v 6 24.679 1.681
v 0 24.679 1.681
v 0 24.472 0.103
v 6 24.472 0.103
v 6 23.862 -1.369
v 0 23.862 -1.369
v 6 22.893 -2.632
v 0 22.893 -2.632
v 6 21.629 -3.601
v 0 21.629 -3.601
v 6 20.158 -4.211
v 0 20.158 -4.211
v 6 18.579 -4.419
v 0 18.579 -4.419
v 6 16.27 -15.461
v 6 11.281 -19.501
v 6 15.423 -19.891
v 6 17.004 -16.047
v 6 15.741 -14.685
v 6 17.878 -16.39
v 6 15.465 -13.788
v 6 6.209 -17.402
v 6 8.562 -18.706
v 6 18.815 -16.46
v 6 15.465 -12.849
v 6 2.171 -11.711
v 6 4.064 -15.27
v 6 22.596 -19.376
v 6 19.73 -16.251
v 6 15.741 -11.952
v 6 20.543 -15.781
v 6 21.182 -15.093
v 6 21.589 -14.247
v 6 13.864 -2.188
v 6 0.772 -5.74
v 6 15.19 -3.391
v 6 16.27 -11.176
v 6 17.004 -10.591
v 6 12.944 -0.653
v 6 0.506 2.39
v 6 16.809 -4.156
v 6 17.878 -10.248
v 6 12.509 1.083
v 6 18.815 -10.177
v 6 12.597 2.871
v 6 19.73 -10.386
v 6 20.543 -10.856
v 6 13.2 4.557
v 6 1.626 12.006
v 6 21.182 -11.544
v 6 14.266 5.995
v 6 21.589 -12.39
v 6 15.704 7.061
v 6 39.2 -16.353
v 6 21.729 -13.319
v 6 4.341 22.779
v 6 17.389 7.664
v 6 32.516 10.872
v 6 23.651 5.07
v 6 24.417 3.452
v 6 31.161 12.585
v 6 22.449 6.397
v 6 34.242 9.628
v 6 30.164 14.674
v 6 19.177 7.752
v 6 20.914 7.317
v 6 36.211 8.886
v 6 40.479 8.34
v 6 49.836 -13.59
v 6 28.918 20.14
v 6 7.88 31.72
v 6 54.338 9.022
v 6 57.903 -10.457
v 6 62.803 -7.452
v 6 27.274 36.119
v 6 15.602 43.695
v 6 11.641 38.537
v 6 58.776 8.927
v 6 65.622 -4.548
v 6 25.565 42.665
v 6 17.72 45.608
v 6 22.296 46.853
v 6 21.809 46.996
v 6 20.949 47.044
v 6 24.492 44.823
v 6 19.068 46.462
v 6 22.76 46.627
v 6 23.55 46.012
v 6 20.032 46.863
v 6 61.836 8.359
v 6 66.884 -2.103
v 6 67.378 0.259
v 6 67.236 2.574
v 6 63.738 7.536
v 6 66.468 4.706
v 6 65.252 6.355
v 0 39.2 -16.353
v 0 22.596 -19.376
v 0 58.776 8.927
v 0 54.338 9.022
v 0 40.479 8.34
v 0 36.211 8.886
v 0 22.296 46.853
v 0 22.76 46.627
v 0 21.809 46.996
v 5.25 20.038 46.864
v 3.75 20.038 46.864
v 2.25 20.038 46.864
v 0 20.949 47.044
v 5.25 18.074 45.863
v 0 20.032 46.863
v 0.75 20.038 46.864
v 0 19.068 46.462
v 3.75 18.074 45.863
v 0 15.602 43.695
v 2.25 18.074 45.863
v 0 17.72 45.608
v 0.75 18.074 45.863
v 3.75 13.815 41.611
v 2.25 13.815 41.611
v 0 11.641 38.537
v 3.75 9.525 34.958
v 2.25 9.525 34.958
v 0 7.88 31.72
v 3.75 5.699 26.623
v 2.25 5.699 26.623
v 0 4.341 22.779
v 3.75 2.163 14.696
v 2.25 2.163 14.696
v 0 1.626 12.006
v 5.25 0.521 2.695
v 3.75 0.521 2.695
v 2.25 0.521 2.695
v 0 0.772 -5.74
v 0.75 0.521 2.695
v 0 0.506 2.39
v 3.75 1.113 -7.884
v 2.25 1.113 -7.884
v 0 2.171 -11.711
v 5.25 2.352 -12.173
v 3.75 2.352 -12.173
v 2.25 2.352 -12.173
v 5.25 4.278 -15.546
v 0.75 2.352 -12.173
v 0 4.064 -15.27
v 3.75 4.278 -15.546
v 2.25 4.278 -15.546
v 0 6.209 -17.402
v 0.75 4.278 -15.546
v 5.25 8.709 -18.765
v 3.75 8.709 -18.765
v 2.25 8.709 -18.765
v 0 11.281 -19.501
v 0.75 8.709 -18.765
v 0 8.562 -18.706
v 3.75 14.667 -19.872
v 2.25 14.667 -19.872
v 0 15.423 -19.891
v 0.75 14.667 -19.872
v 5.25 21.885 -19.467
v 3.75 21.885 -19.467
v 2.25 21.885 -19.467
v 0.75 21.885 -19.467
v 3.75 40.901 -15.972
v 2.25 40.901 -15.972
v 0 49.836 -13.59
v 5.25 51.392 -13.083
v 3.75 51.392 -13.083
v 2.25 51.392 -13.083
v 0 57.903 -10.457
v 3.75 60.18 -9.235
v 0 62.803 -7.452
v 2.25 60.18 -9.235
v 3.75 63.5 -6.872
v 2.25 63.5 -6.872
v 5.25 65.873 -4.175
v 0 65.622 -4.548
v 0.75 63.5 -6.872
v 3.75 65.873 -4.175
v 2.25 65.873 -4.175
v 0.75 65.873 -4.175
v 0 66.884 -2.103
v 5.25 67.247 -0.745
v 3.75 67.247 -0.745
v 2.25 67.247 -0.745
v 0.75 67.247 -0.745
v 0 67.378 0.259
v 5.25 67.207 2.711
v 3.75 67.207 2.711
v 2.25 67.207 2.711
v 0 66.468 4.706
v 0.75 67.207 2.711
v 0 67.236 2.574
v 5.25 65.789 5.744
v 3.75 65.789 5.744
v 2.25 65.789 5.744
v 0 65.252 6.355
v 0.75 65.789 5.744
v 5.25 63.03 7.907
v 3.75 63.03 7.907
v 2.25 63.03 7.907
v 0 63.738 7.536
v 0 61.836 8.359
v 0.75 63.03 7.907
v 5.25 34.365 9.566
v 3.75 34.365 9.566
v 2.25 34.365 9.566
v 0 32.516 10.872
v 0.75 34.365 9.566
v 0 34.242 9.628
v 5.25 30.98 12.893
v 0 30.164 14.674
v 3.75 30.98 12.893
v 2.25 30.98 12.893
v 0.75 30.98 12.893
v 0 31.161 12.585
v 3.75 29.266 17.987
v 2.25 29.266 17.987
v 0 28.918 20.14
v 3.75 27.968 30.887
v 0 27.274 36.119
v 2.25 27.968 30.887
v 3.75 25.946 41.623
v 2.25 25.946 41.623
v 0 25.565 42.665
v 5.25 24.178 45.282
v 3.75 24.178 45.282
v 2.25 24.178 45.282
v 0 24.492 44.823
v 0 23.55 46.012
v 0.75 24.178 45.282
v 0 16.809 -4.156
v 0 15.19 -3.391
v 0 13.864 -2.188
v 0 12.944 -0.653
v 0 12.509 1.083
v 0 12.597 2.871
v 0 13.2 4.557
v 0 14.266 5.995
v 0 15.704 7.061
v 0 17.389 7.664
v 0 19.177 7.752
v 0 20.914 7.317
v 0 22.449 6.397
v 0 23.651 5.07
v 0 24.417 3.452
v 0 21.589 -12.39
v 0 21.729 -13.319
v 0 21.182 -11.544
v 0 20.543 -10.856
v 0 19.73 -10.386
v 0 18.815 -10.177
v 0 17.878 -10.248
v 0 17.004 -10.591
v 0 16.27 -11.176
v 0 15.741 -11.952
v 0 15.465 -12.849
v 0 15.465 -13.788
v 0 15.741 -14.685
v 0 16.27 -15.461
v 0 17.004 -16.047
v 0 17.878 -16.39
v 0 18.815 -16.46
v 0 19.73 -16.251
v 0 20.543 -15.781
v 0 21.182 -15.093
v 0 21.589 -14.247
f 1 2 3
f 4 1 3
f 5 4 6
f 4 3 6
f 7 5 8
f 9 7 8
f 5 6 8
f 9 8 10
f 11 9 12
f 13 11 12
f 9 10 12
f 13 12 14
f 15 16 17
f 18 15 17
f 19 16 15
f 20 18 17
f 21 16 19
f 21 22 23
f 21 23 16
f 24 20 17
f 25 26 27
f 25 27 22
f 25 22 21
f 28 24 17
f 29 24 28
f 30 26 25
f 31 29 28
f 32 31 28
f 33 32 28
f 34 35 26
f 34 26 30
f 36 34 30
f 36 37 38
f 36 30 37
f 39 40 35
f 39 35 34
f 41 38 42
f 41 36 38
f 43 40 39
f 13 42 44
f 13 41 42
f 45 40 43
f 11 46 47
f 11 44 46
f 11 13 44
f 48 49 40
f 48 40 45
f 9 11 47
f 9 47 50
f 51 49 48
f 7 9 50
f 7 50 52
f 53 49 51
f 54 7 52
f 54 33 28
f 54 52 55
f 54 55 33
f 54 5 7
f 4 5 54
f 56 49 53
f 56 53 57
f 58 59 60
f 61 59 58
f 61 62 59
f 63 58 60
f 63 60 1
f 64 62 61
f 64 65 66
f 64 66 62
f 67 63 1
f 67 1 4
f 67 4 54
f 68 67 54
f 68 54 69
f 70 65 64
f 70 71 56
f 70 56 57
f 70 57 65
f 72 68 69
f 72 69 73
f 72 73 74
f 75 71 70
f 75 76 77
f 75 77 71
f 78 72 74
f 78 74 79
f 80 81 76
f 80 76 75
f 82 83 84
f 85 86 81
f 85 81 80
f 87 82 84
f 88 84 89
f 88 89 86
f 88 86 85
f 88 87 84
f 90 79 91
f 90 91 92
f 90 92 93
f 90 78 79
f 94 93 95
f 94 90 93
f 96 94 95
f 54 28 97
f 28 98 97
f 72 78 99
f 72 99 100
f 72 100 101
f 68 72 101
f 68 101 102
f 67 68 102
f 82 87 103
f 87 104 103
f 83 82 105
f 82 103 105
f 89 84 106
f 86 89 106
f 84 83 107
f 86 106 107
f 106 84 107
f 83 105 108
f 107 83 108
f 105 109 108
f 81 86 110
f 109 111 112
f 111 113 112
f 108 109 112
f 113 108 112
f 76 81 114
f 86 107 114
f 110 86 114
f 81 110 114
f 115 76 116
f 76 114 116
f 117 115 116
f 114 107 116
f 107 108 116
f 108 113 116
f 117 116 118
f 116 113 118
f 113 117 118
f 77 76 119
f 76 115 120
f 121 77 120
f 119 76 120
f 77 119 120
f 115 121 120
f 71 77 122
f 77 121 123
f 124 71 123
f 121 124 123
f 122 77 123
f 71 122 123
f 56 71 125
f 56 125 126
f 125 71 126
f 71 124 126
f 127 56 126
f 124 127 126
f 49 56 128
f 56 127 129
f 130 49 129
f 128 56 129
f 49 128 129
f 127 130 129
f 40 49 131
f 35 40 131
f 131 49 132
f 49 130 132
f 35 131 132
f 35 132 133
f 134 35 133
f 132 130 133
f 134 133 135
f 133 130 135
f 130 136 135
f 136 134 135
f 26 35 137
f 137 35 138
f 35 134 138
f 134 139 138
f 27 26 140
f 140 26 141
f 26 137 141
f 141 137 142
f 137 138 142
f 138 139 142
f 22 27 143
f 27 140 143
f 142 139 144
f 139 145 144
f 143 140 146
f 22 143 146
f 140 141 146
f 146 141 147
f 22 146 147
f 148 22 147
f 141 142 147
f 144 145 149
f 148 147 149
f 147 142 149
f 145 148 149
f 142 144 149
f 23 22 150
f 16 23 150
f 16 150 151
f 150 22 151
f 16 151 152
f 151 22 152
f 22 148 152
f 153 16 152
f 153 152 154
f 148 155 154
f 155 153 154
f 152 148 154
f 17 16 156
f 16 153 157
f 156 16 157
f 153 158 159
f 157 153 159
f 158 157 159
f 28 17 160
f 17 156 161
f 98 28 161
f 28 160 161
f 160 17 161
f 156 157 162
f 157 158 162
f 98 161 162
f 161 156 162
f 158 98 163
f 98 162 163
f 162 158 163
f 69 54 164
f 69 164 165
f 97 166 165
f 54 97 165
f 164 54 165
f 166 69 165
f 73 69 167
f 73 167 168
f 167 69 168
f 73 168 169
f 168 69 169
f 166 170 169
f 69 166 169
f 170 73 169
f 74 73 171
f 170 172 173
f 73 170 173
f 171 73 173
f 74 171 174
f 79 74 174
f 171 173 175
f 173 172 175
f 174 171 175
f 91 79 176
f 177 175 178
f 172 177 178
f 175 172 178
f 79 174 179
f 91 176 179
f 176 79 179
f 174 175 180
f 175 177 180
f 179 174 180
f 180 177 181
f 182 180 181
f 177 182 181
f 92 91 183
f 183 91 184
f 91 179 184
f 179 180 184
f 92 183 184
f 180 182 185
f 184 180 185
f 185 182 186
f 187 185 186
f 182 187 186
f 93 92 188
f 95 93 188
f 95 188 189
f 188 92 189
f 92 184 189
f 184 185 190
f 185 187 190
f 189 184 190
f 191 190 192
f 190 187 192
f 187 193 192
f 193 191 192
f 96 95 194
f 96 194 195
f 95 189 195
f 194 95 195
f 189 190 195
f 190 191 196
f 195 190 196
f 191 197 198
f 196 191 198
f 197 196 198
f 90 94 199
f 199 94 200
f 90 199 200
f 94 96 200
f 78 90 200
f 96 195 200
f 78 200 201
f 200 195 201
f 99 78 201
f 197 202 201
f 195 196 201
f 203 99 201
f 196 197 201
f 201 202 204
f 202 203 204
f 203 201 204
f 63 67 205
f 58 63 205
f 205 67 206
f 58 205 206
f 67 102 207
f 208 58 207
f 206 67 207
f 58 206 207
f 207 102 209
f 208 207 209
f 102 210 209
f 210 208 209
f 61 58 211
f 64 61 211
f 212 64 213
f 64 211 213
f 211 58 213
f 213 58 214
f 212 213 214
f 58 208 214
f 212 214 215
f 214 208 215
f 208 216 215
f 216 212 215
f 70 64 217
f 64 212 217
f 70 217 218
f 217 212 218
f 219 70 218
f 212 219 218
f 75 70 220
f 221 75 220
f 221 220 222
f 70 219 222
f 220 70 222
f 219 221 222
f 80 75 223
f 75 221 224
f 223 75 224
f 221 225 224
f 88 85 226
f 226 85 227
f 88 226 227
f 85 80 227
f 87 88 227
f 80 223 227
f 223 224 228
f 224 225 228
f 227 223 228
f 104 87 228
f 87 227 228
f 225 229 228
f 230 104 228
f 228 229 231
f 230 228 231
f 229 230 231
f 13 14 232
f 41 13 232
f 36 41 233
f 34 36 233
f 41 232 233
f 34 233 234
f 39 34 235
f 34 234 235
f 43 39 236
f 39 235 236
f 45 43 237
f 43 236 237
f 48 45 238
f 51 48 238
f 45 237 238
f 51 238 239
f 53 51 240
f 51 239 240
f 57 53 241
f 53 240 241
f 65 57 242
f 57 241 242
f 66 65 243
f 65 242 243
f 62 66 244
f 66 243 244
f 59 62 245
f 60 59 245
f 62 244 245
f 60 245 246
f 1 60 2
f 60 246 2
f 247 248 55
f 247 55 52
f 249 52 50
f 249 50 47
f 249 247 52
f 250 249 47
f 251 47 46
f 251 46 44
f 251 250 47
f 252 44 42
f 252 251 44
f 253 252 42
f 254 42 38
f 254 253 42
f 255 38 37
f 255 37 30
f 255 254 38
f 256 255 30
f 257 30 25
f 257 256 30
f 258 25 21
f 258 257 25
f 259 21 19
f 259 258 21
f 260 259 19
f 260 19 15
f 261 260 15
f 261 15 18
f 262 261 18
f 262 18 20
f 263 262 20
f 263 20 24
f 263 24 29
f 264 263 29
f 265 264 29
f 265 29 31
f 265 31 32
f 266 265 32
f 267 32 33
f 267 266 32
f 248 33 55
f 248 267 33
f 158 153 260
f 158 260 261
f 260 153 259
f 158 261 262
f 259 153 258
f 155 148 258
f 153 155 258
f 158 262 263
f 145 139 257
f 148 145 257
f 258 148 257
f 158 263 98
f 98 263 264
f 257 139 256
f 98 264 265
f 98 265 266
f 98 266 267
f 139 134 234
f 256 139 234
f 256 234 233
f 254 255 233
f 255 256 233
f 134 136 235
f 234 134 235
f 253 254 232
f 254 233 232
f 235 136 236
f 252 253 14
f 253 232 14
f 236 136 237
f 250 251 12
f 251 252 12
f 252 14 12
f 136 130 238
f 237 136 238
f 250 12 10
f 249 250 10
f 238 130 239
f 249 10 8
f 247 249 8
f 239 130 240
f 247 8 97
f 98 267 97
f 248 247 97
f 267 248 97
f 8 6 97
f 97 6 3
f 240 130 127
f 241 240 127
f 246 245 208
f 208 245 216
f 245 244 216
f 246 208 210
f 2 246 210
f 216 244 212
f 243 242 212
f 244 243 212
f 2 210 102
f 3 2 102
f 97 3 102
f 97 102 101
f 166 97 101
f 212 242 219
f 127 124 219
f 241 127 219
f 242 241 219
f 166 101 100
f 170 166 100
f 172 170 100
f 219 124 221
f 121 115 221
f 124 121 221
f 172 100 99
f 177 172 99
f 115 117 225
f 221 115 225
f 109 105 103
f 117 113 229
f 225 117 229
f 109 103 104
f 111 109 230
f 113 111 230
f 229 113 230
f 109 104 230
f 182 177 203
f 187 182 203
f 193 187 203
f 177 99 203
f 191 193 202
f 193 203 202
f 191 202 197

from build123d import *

# Parameters (mm, degrees)
F3_DEPTH = 6
F1_R     = 2
F4_DEPTH = 6
F5_R     = 3.15
F6_DEPTH = 6


with BuildPart() as f3:
    # F0 (on Right) → F3 (new body)
    with BuildSketch(Plane.YZ):
        with BuildLine():
            add(Edge.make_bspline(
                [(21.8086410314, 46.9964575022), (17.3981131494, 47.8828598161), (1.1887611169, 26.6320423816), (-3.1252677895, -23.1308140173), (30.2174352156, -18.7020775832), (70.5573441287, -9.6997097106), (65.9490054224, 14.3461378849), (27.9283679632, 1.8564448745), (29.2276233484, 30.2218935803), (25.4026856023, 46.2741472688), (21.8086410314, 46.9964575022)],
                knots=[0, 0, 0, 0, 0.1254146193, 0.2852619379, 0.410629587, 0.5631354892, 0.6498332046, 0.7816975869, 0.8978023167, 1, 1, 1, 1], degree=3))
        make_face()
        with BuildLine():
            ThreePointArc((18.5794053599, -4.4186457679), (14.2660539947, 5.9947055974), (24.6794053599, 1.6813542321))
            ThreePointArc((24.6794053599, 1.6813542321), (22.8927567252, -2.6319971331), (18.5794053599, -4.4186457679))
        make_face(mode=Mode.SUBTRACT)
    extrude(amount=F3_DEPTH)

    # F1 (on Right) → F4 (cut)
    with BuildSketch(Plane.YZ):
        with Locations((18.5793489218, -13.3186234161)):
            Circle(F1_R)
    extrude(amount=F4_DEPTH, mode=Mode.SUBTRACT)

    # F5 (on Right) → F6 (cut)
    with BuildSketch(Plane.YZ):
        with Locations((18.5794346035, -13.3185721934)):
            Circle(F5_R)
    extrude(amount=F6_DEPTH, mode=Mode.SUBTRACT)


solid = f3.part
